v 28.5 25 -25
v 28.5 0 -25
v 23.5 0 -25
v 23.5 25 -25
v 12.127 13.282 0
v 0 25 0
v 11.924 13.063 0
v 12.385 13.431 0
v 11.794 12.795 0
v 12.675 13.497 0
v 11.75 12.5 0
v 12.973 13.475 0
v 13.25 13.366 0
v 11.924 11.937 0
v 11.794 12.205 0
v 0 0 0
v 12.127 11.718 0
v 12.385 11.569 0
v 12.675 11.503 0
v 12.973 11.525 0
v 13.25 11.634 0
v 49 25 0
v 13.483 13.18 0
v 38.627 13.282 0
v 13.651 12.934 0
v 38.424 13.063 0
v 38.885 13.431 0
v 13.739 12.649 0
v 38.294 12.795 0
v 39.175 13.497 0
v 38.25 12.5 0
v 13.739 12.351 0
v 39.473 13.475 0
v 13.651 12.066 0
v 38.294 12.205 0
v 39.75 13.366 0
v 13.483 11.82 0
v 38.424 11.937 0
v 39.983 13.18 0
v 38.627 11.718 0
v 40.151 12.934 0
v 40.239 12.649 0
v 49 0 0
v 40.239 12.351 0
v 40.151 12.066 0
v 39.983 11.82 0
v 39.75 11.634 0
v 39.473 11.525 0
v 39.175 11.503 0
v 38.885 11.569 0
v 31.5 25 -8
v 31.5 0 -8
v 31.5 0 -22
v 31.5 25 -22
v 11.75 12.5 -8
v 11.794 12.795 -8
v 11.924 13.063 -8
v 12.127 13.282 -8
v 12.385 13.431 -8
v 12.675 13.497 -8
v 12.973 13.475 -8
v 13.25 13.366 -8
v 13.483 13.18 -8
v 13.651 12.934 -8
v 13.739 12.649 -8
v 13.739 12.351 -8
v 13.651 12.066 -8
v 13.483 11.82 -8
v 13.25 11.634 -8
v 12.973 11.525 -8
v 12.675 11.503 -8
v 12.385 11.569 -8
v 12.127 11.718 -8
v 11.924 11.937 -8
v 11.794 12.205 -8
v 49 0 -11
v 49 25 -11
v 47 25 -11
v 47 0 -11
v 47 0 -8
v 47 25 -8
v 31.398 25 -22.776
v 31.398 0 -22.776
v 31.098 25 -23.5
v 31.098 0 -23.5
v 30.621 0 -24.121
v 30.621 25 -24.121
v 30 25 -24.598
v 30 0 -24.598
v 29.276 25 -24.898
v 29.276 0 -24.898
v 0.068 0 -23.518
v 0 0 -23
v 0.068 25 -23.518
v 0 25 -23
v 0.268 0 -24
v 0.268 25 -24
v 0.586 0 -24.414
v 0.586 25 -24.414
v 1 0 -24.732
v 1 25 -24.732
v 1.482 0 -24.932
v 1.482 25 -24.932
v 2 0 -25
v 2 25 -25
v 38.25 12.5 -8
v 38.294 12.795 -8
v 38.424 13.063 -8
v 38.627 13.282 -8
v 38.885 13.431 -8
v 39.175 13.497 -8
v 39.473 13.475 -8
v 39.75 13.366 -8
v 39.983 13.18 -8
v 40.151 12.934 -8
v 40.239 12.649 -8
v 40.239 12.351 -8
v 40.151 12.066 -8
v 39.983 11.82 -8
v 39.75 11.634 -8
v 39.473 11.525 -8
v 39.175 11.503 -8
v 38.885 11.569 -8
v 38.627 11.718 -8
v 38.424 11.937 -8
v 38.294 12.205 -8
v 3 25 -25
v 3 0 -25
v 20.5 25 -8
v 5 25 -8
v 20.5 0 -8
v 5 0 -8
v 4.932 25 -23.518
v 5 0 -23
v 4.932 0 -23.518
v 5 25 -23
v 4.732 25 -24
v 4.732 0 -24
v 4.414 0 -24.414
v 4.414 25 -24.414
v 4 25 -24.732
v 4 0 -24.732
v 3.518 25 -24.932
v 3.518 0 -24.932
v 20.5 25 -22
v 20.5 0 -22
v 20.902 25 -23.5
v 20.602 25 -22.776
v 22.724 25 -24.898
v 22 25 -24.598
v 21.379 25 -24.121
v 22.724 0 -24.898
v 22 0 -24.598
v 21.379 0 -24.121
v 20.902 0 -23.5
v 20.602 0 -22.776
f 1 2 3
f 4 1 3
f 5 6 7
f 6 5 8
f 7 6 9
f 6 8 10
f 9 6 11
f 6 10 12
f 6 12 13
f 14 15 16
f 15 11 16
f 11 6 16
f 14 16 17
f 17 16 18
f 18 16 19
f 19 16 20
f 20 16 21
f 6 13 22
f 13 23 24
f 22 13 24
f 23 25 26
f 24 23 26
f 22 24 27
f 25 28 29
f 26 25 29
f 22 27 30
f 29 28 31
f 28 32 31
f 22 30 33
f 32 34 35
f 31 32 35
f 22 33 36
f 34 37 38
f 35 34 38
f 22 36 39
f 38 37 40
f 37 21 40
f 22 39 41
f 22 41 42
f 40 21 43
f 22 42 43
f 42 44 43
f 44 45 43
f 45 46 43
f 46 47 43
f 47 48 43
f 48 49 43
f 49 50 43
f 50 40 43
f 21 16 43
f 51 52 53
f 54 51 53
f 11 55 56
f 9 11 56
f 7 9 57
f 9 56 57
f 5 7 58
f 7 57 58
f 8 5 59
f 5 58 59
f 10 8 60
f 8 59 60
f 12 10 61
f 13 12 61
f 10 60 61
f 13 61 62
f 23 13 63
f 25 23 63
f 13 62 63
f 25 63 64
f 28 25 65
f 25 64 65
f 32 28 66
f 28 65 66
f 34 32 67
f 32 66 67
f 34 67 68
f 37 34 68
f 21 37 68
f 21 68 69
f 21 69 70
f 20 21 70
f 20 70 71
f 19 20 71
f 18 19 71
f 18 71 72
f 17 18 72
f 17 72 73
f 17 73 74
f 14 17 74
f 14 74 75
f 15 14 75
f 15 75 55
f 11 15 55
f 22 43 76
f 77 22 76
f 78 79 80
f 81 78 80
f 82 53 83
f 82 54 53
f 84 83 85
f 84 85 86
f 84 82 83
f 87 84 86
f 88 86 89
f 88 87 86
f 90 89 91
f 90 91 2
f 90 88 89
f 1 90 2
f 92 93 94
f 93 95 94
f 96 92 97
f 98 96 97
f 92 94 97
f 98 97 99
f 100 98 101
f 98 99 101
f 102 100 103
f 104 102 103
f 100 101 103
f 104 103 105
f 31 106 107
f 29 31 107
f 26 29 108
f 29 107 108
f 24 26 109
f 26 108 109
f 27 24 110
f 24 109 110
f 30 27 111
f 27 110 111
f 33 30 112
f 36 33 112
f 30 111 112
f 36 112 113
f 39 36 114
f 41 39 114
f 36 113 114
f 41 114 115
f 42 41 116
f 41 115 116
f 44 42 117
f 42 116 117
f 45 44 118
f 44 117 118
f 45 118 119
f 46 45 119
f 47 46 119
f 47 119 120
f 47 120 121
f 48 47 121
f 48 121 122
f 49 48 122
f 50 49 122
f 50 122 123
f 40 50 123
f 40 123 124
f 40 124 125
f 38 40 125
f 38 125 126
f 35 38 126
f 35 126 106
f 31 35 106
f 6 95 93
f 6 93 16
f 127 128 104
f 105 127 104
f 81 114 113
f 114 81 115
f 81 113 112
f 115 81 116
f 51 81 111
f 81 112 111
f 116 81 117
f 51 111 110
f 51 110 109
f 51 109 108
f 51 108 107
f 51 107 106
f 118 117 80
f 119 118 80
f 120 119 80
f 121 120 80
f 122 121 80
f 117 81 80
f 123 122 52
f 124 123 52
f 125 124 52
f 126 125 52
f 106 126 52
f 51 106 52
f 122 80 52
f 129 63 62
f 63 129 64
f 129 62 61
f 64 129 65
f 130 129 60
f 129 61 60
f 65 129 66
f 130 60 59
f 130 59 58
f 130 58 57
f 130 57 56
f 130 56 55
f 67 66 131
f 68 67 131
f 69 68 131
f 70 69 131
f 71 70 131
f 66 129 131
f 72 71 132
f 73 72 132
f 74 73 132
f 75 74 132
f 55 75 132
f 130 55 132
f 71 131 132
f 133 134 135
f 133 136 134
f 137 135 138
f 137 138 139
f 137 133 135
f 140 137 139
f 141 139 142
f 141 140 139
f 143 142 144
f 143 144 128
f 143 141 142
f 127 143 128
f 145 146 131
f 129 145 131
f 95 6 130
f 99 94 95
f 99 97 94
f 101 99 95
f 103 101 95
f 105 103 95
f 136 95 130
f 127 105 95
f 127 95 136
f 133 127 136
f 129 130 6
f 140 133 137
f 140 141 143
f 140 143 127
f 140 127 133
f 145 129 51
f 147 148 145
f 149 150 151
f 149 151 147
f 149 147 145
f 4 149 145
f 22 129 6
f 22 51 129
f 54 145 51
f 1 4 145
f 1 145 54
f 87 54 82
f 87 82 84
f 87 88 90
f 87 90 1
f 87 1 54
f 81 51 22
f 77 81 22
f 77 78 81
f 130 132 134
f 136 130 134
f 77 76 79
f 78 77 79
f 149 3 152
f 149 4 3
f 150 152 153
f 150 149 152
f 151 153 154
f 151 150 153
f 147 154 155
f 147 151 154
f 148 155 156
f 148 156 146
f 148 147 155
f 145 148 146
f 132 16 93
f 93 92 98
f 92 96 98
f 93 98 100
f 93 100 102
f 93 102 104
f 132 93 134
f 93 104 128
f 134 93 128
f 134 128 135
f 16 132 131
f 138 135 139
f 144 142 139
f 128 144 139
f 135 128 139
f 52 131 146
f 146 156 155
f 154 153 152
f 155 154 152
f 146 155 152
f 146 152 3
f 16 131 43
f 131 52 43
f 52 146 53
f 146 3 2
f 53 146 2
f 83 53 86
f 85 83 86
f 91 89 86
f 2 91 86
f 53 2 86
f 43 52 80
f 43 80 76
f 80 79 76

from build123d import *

# Parameters (mm, degrees)
BOSS_EXTRUDE1_DEPTH = 25
FILLET2_R           = 3
FILLET3_R           = 2
SKETCH3_R           = 1
CUT_EXTRUDE1_DEPTH  = 58.576036682


with BuildPart() as part:
    # Sketch1 → Boss-Extrude1 (new body)
    with BuildSketch(Plane(origin=(0, 0, 0), x_dir=(1, 0, 0), z_dir=(0, 1, 0))):
        Polygon((0, 0), (49, 0), (49, 11), (47, 11), (47, 8), (31.5, 8), (31.5, 25), (20.5, 25), (20.5, 8), (5, 8), (5, 25), (0, 25), align=None)
    extrude(amount=BOSS_EXTRUDE1_DEPTH)

    # Fillet2
    fillet2_edges = [part.edges().sort_by_distance(p)[0] for p in [
        (20.5, 12.5, -25),
        (31.5, 12.5, -25),
    ]]
    fillet(fillet2_edges, radius=FILLET2_R)

    # Fillet3
    fillet3_edges = [part.edges().sort_by_distance(p)[0] for p in [
        (0, 12.5, -25),
        (5, 12.5, -25),
    ]]
    fillet(fillet3_edges, radius=FILLET3_R)

    # Sketch3 → Cut-Extrude1 (cut, through all)
    with BuildSketch(Plane(origin=(0, 0, -8), x_dir=(-1, 0, 0), z_dir=(0, 0, -1))):
        with Locations((-39.25, 12.5)):
            Circle(SKETCH3_R)
        with Locations((-12.75, 12.5)):
            Circle(SKETCH3_R)
    extrude(amount=-CUT_EXTRUDE1_DEPTH, mode=Mode.SUBTRACT)


solid = part.part
